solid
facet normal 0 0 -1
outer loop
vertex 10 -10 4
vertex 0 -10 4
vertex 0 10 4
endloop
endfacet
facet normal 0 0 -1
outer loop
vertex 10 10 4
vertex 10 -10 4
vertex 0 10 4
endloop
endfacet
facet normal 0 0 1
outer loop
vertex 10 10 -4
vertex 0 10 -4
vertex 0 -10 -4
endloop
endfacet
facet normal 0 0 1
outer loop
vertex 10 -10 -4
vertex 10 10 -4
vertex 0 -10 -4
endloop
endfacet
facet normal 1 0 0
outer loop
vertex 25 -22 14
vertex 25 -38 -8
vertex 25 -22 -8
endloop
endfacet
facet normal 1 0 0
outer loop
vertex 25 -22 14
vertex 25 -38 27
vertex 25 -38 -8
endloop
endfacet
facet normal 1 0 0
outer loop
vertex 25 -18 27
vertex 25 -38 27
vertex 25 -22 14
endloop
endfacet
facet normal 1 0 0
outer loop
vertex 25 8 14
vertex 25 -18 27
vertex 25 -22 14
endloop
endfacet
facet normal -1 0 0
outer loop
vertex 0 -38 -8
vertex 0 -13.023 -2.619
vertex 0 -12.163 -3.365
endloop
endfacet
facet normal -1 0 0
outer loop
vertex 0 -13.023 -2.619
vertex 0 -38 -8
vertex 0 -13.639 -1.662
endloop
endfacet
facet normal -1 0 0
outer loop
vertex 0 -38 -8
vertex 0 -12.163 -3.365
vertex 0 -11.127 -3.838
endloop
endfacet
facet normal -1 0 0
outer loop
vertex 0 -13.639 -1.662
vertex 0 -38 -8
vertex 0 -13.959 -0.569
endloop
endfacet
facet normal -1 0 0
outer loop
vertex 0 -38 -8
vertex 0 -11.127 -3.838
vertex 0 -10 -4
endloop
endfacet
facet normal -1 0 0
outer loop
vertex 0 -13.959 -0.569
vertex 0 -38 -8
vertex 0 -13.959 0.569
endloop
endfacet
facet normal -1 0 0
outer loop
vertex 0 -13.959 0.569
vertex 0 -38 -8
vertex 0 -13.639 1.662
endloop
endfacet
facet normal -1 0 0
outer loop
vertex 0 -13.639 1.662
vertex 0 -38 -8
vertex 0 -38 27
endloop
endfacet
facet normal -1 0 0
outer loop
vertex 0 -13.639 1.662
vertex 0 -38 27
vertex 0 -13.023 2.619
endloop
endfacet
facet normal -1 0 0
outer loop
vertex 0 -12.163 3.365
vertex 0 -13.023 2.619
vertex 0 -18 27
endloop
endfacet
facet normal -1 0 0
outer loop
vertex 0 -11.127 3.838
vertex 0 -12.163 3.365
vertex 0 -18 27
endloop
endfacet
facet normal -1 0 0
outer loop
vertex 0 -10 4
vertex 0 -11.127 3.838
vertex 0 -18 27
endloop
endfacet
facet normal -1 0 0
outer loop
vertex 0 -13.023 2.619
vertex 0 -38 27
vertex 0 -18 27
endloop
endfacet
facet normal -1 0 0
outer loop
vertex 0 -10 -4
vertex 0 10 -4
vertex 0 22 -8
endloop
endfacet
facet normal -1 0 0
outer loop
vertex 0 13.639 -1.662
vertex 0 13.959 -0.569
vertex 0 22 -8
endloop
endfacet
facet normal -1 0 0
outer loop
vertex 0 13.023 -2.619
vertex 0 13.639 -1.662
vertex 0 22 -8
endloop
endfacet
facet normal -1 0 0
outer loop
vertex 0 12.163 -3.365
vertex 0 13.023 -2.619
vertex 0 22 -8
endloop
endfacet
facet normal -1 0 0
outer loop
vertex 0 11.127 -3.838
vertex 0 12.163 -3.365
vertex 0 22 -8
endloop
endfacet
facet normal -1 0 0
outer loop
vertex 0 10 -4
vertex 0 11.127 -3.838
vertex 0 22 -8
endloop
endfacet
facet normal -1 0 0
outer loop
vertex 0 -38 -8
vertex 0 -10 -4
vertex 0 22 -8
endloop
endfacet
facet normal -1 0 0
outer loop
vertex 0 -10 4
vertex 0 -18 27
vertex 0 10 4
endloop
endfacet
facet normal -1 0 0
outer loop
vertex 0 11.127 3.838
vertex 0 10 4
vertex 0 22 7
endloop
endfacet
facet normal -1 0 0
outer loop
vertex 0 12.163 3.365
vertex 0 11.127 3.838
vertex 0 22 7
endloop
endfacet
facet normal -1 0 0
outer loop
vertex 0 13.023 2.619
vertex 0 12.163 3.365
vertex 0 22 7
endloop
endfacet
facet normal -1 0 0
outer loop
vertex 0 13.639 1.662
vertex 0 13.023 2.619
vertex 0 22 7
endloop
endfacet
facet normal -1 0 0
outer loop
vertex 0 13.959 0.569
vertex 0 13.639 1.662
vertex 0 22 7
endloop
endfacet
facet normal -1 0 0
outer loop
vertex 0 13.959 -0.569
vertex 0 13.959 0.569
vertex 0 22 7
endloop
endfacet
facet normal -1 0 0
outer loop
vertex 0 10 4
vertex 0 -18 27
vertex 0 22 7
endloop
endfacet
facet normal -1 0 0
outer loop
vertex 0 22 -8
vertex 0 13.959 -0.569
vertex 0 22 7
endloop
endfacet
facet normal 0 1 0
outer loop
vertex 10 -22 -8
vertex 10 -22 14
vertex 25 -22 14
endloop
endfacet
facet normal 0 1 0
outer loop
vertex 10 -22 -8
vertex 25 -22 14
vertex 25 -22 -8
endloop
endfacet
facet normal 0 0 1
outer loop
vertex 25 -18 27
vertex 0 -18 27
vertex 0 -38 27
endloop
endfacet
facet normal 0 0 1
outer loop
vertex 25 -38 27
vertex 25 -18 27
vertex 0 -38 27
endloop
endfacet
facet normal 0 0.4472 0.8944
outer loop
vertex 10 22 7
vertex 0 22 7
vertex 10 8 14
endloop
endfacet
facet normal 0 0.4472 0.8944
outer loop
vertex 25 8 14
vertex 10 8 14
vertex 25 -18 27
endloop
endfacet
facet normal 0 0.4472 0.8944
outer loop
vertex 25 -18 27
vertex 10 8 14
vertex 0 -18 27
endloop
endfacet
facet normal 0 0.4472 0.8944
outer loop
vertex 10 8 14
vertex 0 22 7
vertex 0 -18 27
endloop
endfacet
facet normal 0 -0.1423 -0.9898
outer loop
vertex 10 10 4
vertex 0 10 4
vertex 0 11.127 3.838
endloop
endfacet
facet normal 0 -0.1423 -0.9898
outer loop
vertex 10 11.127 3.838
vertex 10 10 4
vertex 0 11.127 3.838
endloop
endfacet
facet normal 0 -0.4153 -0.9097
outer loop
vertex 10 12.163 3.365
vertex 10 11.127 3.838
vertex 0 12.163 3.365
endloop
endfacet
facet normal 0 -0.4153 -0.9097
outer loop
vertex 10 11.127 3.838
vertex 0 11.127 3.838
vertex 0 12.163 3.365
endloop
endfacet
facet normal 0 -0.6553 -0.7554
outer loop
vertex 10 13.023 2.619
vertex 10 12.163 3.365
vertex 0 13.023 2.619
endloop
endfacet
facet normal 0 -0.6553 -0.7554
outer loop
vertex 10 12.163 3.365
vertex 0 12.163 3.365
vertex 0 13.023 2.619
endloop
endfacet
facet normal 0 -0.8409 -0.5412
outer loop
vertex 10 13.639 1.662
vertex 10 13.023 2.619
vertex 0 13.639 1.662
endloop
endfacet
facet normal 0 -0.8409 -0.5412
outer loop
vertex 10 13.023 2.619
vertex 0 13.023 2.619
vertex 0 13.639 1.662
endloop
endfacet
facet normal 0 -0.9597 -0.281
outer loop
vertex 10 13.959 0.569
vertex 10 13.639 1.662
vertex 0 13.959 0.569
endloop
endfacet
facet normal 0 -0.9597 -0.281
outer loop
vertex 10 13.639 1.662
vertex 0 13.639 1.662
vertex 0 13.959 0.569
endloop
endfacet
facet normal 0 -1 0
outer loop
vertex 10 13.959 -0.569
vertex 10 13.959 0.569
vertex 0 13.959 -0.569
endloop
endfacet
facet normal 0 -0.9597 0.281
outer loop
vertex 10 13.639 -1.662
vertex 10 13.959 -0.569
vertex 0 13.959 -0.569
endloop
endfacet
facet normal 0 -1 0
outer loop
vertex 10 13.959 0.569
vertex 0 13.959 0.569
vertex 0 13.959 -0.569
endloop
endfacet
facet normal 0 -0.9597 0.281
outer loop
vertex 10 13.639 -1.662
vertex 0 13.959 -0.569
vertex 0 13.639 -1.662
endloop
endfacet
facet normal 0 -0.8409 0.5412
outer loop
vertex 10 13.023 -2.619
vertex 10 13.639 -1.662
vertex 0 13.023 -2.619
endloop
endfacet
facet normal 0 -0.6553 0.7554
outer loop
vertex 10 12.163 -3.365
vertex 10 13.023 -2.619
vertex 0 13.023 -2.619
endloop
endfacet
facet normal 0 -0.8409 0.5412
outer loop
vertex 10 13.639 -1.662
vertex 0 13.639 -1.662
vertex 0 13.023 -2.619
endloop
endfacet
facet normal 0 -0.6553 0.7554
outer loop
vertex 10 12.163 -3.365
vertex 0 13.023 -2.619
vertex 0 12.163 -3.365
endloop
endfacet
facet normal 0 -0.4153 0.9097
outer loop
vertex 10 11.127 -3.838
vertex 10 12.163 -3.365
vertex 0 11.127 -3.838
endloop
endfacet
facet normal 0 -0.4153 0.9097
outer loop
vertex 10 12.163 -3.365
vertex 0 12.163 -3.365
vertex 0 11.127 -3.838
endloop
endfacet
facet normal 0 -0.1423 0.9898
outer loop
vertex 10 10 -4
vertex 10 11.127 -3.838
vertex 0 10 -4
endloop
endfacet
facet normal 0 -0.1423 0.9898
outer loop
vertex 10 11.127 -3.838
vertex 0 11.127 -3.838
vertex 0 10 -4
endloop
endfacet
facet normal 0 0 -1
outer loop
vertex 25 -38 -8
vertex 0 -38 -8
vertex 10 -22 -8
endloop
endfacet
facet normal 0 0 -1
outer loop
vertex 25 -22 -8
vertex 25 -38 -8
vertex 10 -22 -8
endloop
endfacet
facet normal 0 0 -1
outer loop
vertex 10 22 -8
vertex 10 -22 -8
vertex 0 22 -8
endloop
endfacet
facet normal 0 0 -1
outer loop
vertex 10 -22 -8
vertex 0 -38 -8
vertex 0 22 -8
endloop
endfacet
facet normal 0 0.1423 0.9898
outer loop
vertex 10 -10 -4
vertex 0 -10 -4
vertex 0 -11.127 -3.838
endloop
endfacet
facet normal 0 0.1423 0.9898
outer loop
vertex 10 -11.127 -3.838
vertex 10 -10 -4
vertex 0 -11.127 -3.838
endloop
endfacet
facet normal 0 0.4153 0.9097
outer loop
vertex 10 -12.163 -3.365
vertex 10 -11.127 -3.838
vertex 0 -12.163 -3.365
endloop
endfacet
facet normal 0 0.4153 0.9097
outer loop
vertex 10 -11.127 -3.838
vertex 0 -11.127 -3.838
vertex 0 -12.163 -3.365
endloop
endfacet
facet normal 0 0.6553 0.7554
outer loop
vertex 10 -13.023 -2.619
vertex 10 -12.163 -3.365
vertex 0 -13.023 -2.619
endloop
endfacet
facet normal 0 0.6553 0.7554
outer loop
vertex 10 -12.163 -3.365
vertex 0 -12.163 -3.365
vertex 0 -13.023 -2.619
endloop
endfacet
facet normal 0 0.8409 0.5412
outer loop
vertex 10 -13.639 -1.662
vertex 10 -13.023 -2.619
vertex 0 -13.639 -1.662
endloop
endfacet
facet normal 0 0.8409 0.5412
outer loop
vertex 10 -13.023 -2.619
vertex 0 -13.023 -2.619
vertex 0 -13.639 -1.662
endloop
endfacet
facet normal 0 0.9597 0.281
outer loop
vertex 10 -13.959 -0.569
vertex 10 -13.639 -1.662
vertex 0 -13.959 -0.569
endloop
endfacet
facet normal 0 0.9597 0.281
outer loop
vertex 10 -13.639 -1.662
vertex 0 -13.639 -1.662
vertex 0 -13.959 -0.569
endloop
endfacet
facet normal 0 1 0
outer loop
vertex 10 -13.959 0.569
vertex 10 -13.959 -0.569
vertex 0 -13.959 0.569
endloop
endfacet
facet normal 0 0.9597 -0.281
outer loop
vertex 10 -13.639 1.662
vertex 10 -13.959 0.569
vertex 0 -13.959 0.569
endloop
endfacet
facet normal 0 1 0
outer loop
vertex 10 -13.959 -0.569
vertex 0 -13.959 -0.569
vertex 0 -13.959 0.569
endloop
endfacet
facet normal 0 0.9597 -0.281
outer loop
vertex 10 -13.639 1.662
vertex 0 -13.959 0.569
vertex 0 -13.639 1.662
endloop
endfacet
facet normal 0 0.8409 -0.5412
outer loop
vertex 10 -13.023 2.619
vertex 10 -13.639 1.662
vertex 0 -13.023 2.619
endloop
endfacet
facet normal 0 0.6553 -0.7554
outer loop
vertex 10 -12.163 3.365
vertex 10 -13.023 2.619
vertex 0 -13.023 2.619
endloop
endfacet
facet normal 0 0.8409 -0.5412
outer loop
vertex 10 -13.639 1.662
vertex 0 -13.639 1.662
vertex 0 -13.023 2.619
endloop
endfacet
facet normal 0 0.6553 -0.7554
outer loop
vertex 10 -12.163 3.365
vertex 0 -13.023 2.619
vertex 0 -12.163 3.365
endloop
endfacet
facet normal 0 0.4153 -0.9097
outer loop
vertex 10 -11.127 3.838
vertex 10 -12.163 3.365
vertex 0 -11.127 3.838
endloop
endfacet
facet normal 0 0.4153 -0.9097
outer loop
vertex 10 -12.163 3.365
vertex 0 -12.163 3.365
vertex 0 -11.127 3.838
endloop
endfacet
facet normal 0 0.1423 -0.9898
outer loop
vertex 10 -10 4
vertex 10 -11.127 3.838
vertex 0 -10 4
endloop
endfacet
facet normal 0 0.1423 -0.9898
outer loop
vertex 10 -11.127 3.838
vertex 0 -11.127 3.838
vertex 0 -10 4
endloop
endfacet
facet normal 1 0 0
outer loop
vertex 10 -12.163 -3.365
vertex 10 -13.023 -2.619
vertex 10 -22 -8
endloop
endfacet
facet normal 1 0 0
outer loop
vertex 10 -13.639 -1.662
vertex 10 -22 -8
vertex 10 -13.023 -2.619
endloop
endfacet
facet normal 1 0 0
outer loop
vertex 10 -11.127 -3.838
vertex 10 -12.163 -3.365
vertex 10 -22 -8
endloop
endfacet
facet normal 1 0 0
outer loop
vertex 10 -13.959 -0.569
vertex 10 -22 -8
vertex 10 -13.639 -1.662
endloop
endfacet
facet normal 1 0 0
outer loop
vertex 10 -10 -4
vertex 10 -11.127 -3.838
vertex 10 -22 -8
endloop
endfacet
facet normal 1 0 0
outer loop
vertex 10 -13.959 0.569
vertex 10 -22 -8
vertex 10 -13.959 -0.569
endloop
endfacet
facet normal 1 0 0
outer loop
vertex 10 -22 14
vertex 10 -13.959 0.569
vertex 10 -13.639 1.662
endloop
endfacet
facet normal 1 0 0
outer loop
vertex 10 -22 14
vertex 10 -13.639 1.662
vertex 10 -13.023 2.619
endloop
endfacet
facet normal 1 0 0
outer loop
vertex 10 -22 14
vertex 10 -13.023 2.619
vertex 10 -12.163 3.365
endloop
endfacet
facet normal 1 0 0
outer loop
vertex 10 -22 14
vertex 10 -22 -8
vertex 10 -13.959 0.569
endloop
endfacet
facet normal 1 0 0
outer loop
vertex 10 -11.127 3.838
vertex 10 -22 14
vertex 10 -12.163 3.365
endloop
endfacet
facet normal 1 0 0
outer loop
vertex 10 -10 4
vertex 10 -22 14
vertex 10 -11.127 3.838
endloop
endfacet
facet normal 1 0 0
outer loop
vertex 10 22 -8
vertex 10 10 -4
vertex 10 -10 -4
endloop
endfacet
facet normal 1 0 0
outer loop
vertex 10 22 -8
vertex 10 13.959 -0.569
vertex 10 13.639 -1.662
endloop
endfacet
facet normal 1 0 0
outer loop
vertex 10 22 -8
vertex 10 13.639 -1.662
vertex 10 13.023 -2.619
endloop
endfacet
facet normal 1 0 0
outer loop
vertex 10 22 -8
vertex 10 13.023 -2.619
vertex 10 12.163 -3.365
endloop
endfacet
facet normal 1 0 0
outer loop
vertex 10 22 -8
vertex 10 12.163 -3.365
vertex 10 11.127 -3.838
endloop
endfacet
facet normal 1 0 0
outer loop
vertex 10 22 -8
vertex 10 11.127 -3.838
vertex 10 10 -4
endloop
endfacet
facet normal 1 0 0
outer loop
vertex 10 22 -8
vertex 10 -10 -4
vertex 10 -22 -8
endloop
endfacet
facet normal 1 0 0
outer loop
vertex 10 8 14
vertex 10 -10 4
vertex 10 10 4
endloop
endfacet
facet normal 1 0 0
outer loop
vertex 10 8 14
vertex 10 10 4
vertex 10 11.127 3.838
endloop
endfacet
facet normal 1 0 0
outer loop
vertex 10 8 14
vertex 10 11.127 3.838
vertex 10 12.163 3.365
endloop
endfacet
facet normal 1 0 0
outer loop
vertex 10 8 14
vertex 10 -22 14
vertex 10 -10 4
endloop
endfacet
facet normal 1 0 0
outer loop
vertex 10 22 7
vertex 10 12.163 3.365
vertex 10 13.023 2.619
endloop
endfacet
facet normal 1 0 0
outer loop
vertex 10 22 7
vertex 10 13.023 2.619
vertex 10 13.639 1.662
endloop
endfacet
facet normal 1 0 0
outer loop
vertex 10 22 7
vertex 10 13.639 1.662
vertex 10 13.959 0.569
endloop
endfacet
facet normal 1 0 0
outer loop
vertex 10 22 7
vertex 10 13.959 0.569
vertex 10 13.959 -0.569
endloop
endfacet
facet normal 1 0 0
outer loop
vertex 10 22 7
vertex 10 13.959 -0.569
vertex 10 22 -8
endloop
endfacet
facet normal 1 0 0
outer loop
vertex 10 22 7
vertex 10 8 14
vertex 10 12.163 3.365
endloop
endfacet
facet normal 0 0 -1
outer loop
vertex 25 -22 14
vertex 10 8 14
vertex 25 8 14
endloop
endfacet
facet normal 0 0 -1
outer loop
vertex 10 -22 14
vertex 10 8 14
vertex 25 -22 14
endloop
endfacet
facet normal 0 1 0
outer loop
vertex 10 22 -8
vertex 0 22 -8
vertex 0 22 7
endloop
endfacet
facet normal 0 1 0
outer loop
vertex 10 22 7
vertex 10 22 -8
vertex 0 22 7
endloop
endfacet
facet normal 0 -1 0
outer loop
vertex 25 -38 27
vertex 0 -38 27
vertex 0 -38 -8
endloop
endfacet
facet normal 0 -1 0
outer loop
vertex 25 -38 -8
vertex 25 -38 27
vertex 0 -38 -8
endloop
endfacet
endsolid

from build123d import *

# Parameters (mm, degrees)
BOSS_EXTRUDE1_DEPTH = 25
BOSS_EXTRUDE2_DEPTH = 25
CUT_EXTRUDE1_START  = 10
CUT_EXTRUDE1_DEPTH  = 15


with BuildPart() as part:
    # Sketch1 → Boss-Extrude1 (new body)
    with BuildSketch(Plane.YZ):
        Polygon((-38, 27), (-38, -8), (-22, -8), (-22, 14), (8, 14), (-18, 27), align=None)
    extrude(amount=BOSS_EXTRUDE1_DEPTH)

    # Sketch1<3> → Boss-Extrude2 (add)
    with BuildSketch(Plane.YZ):
        Polygon((-22, 14), (-22, -8), (22, -8), (22, 7), (8, 14), align=None)
        with BuildLine():
            ThreePointArc((-10, -4), (-14, 0), (-10, 4))
            Line((-10, 4), (10, 4))
            ThreePointArc((10, 4), (14, 0), (10, -4))
            Line((10, -4), (-10, -4))
        make_face(mode=Mode.SUBTRACT)
    extrude(amount=BOSS_EXTRUDE2_DEPTH)

    # Sketch1<4> → Cut-Extrude1 (cut)
    with BuildSketch(Plane.YZ.offset(CUT_EXTRUDE1_START)):
        Polygon((-22, 14), (-22, -8), (22, -8), (22, 7), (8, 14), align=None)
        with BuildLine():
            ThreePointArc((-10, -4), (-14, 0), (-10, 4))
            Line((-10, 4), (10, 4))
            ThreePointArc((10, 4), (14, 0), (10, -4))
            Line((10, -4), (-10, -4))
        make_face(mode=Mode.SUBTRACT)
    extrude(amount=CUT_EXTRUDE1_DEPTH, mode=Mode.SUBTRACT)


solid = part.part
